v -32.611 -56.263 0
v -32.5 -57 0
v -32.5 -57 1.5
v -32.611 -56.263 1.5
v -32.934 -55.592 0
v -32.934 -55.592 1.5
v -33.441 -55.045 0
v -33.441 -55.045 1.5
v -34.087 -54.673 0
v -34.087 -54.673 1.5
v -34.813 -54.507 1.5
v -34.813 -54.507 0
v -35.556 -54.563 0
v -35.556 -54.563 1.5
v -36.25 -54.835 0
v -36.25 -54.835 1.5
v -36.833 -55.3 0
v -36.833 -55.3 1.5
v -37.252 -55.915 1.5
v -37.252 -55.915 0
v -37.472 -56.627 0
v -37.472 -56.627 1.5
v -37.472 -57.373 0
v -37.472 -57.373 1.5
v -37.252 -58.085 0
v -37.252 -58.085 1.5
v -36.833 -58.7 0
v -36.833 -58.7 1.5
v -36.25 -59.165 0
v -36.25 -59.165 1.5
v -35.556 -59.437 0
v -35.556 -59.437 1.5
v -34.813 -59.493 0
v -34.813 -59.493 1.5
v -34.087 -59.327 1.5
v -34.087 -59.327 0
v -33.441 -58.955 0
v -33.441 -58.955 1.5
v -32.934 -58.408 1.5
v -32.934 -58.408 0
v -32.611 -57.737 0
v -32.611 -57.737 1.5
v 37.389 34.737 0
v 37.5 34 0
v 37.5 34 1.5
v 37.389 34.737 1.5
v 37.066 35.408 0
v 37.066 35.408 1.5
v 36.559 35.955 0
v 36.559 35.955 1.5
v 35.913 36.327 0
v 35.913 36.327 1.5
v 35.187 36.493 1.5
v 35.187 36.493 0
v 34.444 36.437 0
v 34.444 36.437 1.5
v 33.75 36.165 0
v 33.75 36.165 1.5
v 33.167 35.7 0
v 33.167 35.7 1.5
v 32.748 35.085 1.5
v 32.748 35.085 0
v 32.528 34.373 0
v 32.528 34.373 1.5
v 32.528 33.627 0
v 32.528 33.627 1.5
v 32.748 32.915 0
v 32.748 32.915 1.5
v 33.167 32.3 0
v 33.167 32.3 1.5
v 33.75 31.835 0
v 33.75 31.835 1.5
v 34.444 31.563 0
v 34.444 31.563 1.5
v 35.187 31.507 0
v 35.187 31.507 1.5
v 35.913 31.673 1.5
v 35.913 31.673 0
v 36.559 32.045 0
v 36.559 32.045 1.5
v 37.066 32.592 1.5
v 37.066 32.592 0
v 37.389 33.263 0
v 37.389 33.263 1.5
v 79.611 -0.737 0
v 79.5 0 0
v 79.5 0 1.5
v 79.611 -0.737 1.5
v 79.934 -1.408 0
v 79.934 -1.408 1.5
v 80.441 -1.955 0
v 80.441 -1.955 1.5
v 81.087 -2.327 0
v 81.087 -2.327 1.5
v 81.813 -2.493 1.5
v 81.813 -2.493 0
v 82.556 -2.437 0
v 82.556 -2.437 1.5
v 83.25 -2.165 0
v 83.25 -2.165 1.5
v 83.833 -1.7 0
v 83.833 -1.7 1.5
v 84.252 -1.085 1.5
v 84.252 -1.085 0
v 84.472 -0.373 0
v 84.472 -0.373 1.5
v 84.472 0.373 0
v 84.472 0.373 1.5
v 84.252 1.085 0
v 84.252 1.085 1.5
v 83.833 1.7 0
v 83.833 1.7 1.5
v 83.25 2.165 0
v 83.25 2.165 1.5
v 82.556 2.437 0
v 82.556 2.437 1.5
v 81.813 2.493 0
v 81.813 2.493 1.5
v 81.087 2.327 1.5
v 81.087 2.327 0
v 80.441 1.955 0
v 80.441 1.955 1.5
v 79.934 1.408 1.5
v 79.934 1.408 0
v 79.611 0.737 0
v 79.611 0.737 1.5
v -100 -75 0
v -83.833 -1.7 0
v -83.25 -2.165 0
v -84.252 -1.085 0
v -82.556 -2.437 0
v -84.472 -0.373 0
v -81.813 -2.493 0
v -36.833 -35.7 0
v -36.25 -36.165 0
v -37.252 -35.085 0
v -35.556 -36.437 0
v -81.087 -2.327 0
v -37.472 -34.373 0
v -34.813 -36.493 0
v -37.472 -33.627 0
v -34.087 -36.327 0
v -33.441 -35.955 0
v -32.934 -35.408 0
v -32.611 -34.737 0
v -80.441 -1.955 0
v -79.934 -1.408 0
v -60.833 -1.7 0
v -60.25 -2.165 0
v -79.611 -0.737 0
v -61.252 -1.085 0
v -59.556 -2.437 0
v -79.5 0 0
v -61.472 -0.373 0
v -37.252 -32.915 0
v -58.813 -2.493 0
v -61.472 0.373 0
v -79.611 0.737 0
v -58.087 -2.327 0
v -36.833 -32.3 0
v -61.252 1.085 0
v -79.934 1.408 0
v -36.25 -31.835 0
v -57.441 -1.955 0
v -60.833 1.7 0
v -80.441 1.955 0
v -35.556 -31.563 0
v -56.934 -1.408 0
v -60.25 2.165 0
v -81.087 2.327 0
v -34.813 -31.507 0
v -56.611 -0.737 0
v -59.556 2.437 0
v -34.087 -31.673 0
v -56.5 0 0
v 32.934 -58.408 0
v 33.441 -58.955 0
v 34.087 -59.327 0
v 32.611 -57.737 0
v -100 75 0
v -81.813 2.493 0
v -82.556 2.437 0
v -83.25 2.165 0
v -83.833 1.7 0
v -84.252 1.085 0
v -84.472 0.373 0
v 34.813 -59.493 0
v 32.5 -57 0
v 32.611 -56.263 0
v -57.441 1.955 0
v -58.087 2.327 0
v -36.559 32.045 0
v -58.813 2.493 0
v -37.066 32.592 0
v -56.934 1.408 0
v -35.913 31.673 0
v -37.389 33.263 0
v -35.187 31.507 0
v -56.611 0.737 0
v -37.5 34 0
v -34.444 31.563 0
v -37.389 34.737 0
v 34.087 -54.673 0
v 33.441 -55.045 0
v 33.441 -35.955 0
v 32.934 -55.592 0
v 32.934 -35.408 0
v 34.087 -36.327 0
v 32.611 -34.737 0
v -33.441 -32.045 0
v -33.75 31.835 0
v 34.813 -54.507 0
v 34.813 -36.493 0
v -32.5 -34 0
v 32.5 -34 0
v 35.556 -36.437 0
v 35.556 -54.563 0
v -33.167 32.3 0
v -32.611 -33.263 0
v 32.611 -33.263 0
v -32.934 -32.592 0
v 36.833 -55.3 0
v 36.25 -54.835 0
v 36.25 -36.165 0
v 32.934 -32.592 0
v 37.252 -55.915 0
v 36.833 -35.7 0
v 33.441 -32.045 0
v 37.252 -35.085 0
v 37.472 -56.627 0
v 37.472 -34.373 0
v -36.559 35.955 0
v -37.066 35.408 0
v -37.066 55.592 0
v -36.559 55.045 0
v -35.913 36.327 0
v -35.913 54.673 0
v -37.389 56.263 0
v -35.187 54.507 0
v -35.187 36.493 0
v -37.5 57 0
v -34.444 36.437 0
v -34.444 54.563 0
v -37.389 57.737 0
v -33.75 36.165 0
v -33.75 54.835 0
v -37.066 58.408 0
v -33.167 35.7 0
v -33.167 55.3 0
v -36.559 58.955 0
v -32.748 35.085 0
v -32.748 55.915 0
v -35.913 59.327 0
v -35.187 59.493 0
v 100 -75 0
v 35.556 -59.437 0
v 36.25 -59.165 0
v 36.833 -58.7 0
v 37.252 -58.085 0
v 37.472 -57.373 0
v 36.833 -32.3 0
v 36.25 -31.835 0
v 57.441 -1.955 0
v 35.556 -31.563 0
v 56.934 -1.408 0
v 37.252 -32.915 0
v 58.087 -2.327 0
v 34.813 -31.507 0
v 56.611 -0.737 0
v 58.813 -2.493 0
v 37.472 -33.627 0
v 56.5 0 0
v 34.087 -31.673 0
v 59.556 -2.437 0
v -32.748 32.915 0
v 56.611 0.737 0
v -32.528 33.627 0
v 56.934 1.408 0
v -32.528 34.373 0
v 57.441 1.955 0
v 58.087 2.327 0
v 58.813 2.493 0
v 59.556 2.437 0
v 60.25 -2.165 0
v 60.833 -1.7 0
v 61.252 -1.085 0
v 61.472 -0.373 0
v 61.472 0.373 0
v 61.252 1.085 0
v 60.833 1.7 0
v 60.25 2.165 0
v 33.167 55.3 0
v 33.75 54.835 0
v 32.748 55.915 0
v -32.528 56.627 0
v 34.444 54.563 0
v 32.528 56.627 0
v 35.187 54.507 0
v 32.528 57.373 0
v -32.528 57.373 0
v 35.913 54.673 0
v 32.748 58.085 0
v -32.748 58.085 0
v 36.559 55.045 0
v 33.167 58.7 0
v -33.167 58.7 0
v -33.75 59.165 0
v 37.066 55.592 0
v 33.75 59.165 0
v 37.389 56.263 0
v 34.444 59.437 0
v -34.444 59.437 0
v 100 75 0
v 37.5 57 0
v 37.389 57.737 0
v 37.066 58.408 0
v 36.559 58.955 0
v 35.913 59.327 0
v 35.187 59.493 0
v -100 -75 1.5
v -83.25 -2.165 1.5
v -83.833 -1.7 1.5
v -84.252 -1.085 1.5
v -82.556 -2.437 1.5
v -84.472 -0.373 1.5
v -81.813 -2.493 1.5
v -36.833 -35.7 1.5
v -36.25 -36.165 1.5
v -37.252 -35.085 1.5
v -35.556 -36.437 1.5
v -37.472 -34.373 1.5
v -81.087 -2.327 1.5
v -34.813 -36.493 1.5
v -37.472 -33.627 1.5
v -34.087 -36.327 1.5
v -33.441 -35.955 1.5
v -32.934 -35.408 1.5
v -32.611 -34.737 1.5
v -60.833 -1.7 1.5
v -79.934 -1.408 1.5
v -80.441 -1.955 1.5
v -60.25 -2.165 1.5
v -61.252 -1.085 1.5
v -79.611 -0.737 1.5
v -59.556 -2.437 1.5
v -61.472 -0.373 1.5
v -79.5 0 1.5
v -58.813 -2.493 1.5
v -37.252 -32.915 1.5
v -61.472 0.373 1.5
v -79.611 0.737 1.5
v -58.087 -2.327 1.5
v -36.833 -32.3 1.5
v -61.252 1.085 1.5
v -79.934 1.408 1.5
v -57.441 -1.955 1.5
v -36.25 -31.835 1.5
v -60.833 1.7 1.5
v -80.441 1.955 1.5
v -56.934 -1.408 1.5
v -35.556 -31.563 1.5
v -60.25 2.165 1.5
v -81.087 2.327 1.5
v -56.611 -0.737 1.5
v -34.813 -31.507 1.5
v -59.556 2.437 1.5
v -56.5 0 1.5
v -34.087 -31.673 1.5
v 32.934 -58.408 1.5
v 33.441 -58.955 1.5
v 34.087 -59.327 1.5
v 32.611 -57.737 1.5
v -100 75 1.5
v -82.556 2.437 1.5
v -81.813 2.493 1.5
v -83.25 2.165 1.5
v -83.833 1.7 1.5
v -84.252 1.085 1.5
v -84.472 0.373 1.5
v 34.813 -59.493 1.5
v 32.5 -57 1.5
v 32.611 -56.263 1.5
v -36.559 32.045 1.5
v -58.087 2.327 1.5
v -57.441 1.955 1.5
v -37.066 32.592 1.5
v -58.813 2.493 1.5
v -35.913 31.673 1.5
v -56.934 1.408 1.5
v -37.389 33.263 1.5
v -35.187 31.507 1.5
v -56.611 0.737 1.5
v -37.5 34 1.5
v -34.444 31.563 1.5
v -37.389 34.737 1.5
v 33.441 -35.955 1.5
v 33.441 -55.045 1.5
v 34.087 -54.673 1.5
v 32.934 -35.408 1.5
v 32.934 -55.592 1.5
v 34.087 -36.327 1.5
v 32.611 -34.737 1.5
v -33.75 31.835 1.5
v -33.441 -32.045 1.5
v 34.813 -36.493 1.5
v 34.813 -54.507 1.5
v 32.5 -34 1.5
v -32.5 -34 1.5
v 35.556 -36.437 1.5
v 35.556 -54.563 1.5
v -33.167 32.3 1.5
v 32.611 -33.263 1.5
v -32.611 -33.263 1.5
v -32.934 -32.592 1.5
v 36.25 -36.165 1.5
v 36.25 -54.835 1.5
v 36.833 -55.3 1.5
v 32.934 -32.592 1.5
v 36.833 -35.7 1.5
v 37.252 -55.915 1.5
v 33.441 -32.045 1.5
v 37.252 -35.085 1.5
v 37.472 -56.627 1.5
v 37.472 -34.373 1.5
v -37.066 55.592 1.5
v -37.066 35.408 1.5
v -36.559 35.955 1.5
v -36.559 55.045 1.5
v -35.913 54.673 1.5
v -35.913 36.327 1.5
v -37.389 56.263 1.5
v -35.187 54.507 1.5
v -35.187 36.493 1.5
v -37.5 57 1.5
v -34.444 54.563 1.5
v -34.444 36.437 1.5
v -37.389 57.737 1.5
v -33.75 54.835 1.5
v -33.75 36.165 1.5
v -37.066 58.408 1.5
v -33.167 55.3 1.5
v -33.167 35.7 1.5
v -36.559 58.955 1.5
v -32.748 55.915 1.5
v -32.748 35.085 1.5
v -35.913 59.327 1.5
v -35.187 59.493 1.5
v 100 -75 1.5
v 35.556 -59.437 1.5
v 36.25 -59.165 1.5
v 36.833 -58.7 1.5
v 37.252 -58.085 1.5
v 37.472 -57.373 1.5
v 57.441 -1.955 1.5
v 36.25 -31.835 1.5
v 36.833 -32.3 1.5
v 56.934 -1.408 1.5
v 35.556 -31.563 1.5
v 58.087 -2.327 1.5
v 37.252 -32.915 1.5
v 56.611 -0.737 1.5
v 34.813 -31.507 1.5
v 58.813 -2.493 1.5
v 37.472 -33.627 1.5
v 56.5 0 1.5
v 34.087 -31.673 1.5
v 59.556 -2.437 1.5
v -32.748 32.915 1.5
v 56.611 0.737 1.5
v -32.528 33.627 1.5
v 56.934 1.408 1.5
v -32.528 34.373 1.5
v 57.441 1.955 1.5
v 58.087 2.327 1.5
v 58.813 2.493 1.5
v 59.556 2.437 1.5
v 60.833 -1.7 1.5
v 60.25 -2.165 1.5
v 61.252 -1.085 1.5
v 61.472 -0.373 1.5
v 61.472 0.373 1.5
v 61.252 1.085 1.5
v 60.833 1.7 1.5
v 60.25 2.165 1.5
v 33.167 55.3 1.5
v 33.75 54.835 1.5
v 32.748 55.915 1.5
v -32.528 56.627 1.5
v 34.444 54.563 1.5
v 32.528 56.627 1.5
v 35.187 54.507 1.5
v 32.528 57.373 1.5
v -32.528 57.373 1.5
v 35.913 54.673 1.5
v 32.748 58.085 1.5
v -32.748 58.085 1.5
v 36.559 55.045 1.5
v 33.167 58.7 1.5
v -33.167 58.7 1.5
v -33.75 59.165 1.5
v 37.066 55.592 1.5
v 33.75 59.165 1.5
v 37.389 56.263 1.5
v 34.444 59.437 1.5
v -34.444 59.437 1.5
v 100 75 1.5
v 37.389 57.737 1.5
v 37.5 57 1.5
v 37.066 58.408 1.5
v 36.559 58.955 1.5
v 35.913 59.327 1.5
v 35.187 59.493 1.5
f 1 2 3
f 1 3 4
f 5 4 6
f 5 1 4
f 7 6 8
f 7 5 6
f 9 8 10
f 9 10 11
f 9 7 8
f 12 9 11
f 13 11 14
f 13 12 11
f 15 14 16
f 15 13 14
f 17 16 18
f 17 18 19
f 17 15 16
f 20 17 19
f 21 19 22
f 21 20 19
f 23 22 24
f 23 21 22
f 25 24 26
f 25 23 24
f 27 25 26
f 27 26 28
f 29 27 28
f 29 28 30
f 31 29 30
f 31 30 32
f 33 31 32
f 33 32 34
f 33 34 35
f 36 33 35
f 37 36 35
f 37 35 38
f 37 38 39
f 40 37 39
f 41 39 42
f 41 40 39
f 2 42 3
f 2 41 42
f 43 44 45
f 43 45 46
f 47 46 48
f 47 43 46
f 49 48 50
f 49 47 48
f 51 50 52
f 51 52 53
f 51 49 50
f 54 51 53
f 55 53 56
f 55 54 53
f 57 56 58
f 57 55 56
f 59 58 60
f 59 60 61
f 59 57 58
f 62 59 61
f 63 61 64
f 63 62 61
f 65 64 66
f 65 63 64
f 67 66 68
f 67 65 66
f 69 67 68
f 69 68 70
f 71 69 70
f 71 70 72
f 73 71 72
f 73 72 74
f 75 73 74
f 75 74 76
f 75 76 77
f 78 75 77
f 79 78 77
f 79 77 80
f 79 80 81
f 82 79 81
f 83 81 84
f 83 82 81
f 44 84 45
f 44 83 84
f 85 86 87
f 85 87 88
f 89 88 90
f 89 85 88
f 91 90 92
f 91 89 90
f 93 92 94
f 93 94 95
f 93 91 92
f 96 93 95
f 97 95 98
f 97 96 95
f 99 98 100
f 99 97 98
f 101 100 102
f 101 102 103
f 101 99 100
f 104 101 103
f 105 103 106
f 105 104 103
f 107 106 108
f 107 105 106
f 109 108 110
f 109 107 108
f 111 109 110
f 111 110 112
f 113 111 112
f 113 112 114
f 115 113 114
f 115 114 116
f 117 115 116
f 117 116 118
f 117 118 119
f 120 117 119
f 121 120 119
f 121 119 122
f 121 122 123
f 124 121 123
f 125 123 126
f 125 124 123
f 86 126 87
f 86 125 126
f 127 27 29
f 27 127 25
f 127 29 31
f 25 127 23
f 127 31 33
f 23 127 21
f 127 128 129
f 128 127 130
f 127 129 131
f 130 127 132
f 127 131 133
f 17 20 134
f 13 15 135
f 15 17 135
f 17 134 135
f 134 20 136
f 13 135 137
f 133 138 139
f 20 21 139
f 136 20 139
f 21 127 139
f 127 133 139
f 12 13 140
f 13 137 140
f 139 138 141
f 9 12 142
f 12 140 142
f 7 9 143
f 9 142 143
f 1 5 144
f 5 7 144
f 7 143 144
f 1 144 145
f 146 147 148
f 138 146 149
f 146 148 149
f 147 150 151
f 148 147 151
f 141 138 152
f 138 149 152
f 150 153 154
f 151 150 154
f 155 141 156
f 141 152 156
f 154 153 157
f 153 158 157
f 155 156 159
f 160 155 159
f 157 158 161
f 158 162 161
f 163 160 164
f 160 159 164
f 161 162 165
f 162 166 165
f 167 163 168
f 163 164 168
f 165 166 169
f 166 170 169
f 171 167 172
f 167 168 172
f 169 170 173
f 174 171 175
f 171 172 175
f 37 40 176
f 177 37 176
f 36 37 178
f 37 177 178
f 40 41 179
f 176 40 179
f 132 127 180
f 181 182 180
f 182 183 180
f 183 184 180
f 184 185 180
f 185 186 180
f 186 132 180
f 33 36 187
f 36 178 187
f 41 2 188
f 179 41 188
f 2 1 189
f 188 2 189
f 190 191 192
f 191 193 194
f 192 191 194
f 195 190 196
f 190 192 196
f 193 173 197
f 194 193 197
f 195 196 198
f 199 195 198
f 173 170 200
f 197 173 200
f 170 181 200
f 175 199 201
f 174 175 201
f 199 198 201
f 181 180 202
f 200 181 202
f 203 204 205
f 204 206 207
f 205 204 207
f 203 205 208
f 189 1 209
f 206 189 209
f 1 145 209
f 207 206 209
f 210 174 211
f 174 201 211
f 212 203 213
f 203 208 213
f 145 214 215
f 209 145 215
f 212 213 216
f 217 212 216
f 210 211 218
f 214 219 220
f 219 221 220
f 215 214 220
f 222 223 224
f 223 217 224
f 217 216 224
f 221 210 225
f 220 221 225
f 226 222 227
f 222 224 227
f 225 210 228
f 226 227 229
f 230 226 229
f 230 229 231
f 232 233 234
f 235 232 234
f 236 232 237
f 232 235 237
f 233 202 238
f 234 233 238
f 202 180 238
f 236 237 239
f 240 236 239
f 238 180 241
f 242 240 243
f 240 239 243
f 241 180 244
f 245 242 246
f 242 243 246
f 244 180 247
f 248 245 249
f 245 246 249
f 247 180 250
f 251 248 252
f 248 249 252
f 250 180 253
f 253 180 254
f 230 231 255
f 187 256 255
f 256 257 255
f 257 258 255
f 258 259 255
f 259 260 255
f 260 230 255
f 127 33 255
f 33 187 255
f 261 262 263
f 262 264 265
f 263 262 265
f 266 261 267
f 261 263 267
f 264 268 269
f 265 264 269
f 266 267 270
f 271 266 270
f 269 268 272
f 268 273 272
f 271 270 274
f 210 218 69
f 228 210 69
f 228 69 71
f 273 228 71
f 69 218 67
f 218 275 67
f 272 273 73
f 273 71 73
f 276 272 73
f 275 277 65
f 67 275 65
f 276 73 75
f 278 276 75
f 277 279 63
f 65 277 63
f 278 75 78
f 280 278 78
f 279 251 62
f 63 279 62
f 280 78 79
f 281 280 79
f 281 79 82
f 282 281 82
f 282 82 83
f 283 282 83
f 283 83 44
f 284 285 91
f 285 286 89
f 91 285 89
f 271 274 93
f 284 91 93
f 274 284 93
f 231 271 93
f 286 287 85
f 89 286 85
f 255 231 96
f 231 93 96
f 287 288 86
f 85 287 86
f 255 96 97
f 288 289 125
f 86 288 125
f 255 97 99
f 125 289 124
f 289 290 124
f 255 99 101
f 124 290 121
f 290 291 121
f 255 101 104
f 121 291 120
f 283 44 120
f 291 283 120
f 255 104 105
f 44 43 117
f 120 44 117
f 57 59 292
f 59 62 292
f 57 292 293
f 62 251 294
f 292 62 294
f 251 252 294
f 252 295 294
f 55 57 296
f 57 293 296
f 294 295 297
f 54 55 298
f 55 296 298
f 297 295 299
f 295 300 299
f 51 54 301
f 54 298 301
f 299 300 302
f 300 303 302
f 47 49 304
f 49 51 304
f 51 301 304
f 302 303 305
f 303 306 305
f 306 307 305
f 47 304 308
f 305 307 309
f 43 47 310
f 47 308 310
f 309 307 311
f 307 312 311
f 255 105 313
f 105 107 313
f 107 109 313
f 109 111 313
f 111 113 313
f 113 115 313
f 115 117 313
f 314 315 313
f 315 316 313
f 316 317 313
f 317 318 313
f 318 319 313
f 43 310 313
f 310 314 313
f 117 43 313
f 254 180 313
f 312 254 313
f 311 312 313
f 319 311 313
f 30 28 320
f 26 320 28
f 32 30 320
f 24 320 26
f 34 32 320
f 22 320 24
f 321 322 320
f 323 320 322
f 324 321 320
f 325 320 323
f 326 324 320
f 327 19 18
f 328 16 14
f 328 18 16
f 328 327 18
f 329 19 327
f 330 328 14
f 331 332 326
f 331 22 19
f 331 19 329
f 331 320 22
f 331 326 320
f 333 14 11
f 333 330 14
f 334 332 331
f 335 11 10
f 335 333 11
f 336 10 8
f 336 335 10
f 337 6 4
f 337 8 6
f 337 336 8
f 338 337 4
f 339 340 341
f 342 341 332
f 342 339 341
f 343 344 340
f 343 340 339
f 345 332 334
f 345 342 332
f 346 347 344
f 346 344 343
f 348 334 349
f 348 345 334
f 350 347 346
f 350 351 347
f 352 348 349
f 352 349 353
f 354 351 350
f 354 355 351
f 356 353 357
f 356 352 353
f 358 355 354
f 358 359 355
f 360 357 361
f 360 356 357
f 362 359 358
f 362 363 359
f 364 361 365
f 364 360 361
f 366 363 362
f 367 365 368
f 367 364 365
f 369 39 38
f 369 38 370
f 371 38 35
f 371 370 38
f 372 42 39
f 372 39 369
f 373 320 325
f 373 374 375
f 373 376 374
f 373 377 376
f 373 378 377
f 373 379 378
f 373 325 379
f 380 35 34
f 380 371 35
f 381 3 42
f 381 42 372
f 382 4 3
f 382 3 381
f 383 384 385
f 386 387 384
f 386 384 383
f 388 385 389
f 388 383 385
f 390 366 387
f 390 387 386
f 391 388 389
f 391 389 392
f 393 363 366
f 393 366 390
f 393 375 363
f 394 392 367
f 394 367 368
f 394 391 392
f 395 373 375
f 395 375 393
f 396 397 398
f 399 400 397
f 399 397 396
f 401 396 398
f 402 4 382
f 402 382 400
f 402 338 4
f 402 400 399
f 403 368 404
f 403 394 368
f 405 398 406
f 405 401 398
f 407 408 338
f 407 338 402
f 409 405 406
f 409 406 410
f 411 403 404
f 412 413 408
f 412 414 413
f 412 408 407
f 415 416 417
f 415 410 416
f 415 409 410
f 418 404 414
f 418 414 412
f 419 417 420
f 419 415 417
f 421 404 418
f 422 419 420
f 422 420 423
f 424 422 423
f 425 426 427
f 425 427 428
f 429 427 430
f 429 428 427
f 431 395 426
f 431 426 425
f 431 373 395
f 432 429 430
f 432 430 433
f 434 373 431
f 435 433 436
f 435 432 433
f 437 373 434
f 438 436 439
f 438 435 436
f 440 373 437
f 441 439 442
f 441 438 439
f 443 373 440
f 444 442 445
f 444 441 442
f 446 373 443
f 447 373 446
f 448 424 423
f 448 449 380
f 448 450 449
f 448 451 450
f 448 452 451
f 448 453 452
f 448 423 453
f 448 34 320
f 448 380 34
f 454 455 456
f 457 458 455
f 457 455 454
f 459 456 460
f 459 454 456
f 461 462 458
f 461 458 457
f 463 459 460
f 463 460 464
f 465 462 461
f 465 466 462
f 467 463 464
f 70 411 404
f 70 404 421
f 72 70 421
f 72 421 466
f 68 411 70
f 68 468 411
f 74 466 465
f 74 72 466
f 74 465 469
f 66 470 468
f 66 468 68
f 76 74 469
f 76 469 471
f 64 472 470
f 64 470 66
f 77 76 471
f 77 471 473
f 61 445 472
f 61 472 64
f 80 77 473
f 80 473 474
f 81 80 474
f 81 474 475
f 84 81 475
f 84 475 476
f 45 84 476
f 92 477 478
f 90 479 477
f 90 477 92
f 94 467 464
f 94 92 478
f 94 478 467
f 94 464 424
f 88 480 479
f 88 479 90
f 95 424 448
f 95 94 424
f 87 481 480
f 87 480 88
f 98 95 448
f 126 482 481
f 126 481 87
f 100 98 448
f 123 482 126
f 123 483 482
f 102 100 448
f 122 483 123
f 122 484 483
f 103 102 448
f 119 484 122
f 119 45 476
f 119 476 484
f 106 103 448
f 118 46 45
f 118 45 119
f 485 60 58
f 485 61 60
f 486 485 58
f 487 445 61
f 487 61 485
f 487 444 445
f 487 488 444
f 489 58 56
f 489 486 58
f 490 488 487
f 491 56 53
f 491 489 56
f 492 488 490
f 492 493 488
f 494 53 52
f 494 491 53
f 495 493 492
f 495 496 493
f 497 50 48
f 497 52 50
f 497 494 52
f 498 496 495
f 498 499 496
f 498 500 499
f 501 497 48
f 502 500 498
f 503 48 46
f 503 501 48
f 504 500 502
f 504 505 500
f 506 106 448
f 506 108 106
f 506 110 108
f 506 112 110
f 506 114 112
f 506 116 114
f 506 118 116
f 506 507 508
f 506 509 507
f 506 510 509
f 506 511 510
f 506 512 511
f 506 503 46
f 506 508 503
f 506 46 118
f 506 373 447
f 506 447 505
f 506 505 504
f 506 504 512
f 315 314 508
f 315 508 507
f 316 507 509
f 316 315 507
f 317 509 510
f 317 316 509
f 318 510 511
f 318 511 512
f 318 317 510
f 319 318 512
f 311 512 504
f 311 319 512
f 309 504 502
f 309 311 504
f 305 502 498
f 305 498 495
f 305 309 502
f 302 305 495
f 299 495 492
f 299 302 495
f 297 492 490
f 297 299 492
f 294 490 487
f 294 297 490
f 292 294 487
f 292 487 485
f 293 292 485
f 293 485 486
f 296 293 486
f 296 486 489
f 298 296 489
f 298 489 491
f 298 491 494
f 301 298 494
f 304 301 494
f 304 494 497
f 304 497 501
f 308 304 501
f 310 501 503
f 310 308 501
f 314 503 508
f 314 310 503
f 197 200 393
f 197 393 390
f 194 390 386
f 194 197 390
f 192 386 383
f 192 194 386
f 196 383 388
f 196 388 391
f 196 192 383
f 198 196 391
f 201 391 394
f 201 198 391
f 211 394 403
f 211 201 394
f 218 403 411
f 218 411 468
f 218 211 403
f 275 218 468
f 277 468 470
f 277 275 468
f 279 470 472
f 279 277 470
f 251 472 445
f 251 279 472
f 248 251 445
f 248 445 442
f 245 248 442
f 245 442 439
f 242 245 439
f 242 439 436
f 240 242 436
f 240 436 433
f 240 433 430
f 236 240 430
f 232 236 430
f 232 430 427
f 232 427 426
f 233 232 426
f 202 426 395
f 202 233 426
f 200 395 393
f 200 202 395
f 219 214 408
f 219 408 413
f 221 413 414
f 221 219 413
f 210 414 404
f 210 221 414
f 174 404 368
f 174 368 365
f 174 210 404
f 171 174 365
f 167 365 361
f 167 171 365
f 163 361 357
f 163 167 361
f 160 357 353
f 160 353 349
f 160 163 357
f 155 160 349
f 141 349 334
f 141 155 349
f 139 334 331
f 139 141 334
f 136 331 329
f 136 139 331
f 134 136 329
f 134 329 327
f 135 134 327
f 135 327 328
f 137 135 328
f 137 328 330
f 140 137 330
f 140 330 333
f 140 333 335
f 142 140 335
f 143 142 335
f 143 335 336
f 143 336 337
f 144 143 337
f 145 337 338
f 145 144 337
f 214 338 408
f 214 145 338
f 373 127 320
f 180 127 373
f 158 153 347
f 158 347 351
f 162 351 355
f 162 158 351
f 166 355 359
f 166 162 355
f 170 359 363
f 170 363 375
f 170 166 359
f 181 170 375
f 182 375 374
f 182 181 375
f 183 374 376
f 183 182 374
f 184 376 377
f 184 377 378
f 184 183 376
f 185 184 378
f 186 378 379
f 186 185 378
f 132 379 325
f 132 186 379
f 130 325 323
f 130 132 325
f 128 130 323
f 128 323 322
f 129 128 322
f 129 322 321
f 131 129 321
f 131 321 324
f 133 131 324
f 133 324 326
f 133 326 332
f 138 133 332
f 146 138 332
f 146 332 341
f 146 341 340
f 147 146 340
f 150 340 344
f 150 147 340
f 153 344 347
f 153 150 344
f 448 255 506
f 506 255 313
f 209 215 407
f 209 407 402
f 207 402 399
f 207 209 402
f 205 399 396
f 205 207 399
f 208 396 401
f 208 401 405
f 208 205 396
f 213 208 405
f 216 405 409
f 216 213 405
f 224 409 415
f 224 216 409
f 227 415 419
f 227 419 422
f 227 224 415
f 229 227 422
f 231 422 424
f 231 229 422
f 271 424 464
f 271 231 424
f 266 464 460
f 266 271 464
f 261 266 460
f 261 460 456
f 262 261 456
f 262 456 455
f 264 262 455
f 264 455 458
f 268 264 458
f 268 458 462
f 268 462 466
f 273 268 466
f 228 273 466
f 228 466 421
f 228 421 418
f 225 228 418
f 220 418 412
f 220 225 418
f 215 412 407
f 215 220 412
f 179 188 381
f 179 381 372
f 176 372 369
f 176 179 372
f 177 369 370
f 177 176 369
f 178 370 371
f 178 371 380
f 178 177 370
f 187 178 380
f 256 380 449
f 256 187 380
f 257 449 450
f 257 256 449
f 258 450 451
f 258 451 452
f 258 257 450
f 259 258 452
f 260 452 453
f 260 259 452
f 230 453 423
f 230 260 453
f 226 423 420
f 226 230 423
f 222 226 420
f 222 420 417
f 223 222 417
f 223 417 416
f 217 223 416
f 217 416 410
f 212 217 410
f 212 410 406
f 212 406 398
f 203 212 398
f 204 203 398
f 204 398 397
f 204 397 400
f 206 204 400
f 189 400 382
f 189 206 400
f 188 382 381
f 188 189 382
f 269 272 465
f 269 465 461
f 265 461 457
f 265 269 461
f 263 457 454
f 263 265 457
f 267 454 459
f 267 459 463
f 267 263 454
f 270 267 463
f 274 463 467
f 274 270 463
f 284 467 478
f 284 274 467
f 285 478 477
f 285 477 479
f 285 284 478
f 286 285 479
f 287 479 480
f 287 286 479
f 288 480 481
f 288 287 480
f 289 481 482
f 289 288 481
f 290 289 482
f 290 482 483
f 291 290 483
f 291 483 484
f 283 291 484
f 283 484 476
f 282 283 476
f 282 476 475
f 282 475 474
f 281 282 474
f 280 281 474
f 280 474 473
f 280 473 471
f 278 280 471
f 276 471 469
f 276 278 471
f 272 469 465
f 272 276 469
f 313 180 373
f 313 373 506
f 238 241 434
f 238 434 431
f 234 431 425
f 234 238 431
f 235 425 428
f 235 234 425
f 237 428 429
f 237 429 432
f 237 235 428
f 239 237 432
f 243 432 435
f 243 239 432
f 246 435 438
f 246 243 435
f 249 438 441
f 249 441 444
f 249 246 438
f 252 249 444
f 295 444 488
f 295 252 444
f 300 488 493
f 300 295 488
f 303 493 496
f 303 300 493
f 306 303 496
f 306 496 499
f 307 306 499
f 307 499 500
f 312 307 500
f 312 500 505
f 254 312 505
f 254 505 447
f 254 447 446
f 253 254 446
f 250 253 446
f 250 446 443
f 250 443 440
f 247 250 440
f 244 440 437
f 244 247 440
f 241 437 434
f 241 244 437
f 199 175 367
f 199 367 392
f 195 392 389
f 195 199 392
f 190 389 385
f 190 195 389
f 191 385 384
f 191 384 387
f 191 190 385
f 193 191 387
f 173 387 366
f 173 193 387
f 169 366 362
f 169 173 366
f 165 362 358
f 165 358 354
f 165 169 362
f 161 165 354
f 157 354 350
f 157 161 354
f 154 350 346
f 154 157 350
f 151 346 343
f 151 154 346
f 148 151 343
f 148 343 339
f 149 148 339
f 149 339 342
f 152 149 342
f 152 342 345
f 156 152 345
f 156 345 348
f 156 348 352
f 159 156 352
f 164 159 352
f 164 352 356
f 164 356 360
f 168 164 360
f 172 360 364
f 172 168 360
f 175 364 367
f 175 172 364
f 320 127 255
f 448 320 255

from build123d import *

# Parameters (mm, degrees)
SKETCH_1_W      = 200
SKETCH_1_H      = 150
SKETCH_1_R      = 2.5
EXTRUDE_1_DEPTH = 1.5


with BuildPart() as part:
    # 草图1 → 凸台-拉伸1 (new body)
    with BuildSketch(Plane.XY):
        Rectangle(SKETCH_1_W, SKETCH_1_H)
        with Locations((-82, 0)):
            Circle(SKETCH_1_R, mode=Mode.SUBTRACT)
        with Locations((-59, 0)):
            Circle(SKETCH_1_R, mode=Mode.SUBTRACT)
        with Locations(Location((59, 0, 0), (0, 0, 180))):
            Circle(SKETCH_1_R, mode=Mode.SUBTRACT)
        with Locations(Location((82, 0, 0), (0, 0, 180))):
            Circle(SKETCH_1_R, mode=Mode.SUBTRACT)
        with Locations((-35, -34)):
            Circle(SKETCH_1_R, mode=Mode.SUBTRACT)
        with Locations((-35, -57)):
            Circle(SKETCH_1_R, mode=Mode.SUBTRACT)
        with Locations(Location((35, -57, 0), (0, 0, 180))):
            Circle(SKETCH_1_R, mode=Mode.SUBTRACT)
        with Locations(Location((35, -34, 0), (0, 0, 180))):
            Circle(SKETCH_1_R, mode=Mode.SUBTRACT)
        with Locations((35, 57)):
            Circle(SKETCH_1_R, mode=Mode.SUBTRACT)
        with Locations((35, 34)):
            Circle(SKETCH_1_R, mode=Mode.SUBTRACT)
        with Locations(Location((-35, 57, 0), (0, 0, 180))):
            Circle(SKETCH_1_R, mode=Mode.SUBTRACT)
        with Locations(Location((-35, 34, 0), (0, 0, 180))):
            Circle(SKETCH_1_R, mode=Mode.SUBTRACT)
    extrude(amount=EXTRUDE_1_DEPTH)


solid = part.part
